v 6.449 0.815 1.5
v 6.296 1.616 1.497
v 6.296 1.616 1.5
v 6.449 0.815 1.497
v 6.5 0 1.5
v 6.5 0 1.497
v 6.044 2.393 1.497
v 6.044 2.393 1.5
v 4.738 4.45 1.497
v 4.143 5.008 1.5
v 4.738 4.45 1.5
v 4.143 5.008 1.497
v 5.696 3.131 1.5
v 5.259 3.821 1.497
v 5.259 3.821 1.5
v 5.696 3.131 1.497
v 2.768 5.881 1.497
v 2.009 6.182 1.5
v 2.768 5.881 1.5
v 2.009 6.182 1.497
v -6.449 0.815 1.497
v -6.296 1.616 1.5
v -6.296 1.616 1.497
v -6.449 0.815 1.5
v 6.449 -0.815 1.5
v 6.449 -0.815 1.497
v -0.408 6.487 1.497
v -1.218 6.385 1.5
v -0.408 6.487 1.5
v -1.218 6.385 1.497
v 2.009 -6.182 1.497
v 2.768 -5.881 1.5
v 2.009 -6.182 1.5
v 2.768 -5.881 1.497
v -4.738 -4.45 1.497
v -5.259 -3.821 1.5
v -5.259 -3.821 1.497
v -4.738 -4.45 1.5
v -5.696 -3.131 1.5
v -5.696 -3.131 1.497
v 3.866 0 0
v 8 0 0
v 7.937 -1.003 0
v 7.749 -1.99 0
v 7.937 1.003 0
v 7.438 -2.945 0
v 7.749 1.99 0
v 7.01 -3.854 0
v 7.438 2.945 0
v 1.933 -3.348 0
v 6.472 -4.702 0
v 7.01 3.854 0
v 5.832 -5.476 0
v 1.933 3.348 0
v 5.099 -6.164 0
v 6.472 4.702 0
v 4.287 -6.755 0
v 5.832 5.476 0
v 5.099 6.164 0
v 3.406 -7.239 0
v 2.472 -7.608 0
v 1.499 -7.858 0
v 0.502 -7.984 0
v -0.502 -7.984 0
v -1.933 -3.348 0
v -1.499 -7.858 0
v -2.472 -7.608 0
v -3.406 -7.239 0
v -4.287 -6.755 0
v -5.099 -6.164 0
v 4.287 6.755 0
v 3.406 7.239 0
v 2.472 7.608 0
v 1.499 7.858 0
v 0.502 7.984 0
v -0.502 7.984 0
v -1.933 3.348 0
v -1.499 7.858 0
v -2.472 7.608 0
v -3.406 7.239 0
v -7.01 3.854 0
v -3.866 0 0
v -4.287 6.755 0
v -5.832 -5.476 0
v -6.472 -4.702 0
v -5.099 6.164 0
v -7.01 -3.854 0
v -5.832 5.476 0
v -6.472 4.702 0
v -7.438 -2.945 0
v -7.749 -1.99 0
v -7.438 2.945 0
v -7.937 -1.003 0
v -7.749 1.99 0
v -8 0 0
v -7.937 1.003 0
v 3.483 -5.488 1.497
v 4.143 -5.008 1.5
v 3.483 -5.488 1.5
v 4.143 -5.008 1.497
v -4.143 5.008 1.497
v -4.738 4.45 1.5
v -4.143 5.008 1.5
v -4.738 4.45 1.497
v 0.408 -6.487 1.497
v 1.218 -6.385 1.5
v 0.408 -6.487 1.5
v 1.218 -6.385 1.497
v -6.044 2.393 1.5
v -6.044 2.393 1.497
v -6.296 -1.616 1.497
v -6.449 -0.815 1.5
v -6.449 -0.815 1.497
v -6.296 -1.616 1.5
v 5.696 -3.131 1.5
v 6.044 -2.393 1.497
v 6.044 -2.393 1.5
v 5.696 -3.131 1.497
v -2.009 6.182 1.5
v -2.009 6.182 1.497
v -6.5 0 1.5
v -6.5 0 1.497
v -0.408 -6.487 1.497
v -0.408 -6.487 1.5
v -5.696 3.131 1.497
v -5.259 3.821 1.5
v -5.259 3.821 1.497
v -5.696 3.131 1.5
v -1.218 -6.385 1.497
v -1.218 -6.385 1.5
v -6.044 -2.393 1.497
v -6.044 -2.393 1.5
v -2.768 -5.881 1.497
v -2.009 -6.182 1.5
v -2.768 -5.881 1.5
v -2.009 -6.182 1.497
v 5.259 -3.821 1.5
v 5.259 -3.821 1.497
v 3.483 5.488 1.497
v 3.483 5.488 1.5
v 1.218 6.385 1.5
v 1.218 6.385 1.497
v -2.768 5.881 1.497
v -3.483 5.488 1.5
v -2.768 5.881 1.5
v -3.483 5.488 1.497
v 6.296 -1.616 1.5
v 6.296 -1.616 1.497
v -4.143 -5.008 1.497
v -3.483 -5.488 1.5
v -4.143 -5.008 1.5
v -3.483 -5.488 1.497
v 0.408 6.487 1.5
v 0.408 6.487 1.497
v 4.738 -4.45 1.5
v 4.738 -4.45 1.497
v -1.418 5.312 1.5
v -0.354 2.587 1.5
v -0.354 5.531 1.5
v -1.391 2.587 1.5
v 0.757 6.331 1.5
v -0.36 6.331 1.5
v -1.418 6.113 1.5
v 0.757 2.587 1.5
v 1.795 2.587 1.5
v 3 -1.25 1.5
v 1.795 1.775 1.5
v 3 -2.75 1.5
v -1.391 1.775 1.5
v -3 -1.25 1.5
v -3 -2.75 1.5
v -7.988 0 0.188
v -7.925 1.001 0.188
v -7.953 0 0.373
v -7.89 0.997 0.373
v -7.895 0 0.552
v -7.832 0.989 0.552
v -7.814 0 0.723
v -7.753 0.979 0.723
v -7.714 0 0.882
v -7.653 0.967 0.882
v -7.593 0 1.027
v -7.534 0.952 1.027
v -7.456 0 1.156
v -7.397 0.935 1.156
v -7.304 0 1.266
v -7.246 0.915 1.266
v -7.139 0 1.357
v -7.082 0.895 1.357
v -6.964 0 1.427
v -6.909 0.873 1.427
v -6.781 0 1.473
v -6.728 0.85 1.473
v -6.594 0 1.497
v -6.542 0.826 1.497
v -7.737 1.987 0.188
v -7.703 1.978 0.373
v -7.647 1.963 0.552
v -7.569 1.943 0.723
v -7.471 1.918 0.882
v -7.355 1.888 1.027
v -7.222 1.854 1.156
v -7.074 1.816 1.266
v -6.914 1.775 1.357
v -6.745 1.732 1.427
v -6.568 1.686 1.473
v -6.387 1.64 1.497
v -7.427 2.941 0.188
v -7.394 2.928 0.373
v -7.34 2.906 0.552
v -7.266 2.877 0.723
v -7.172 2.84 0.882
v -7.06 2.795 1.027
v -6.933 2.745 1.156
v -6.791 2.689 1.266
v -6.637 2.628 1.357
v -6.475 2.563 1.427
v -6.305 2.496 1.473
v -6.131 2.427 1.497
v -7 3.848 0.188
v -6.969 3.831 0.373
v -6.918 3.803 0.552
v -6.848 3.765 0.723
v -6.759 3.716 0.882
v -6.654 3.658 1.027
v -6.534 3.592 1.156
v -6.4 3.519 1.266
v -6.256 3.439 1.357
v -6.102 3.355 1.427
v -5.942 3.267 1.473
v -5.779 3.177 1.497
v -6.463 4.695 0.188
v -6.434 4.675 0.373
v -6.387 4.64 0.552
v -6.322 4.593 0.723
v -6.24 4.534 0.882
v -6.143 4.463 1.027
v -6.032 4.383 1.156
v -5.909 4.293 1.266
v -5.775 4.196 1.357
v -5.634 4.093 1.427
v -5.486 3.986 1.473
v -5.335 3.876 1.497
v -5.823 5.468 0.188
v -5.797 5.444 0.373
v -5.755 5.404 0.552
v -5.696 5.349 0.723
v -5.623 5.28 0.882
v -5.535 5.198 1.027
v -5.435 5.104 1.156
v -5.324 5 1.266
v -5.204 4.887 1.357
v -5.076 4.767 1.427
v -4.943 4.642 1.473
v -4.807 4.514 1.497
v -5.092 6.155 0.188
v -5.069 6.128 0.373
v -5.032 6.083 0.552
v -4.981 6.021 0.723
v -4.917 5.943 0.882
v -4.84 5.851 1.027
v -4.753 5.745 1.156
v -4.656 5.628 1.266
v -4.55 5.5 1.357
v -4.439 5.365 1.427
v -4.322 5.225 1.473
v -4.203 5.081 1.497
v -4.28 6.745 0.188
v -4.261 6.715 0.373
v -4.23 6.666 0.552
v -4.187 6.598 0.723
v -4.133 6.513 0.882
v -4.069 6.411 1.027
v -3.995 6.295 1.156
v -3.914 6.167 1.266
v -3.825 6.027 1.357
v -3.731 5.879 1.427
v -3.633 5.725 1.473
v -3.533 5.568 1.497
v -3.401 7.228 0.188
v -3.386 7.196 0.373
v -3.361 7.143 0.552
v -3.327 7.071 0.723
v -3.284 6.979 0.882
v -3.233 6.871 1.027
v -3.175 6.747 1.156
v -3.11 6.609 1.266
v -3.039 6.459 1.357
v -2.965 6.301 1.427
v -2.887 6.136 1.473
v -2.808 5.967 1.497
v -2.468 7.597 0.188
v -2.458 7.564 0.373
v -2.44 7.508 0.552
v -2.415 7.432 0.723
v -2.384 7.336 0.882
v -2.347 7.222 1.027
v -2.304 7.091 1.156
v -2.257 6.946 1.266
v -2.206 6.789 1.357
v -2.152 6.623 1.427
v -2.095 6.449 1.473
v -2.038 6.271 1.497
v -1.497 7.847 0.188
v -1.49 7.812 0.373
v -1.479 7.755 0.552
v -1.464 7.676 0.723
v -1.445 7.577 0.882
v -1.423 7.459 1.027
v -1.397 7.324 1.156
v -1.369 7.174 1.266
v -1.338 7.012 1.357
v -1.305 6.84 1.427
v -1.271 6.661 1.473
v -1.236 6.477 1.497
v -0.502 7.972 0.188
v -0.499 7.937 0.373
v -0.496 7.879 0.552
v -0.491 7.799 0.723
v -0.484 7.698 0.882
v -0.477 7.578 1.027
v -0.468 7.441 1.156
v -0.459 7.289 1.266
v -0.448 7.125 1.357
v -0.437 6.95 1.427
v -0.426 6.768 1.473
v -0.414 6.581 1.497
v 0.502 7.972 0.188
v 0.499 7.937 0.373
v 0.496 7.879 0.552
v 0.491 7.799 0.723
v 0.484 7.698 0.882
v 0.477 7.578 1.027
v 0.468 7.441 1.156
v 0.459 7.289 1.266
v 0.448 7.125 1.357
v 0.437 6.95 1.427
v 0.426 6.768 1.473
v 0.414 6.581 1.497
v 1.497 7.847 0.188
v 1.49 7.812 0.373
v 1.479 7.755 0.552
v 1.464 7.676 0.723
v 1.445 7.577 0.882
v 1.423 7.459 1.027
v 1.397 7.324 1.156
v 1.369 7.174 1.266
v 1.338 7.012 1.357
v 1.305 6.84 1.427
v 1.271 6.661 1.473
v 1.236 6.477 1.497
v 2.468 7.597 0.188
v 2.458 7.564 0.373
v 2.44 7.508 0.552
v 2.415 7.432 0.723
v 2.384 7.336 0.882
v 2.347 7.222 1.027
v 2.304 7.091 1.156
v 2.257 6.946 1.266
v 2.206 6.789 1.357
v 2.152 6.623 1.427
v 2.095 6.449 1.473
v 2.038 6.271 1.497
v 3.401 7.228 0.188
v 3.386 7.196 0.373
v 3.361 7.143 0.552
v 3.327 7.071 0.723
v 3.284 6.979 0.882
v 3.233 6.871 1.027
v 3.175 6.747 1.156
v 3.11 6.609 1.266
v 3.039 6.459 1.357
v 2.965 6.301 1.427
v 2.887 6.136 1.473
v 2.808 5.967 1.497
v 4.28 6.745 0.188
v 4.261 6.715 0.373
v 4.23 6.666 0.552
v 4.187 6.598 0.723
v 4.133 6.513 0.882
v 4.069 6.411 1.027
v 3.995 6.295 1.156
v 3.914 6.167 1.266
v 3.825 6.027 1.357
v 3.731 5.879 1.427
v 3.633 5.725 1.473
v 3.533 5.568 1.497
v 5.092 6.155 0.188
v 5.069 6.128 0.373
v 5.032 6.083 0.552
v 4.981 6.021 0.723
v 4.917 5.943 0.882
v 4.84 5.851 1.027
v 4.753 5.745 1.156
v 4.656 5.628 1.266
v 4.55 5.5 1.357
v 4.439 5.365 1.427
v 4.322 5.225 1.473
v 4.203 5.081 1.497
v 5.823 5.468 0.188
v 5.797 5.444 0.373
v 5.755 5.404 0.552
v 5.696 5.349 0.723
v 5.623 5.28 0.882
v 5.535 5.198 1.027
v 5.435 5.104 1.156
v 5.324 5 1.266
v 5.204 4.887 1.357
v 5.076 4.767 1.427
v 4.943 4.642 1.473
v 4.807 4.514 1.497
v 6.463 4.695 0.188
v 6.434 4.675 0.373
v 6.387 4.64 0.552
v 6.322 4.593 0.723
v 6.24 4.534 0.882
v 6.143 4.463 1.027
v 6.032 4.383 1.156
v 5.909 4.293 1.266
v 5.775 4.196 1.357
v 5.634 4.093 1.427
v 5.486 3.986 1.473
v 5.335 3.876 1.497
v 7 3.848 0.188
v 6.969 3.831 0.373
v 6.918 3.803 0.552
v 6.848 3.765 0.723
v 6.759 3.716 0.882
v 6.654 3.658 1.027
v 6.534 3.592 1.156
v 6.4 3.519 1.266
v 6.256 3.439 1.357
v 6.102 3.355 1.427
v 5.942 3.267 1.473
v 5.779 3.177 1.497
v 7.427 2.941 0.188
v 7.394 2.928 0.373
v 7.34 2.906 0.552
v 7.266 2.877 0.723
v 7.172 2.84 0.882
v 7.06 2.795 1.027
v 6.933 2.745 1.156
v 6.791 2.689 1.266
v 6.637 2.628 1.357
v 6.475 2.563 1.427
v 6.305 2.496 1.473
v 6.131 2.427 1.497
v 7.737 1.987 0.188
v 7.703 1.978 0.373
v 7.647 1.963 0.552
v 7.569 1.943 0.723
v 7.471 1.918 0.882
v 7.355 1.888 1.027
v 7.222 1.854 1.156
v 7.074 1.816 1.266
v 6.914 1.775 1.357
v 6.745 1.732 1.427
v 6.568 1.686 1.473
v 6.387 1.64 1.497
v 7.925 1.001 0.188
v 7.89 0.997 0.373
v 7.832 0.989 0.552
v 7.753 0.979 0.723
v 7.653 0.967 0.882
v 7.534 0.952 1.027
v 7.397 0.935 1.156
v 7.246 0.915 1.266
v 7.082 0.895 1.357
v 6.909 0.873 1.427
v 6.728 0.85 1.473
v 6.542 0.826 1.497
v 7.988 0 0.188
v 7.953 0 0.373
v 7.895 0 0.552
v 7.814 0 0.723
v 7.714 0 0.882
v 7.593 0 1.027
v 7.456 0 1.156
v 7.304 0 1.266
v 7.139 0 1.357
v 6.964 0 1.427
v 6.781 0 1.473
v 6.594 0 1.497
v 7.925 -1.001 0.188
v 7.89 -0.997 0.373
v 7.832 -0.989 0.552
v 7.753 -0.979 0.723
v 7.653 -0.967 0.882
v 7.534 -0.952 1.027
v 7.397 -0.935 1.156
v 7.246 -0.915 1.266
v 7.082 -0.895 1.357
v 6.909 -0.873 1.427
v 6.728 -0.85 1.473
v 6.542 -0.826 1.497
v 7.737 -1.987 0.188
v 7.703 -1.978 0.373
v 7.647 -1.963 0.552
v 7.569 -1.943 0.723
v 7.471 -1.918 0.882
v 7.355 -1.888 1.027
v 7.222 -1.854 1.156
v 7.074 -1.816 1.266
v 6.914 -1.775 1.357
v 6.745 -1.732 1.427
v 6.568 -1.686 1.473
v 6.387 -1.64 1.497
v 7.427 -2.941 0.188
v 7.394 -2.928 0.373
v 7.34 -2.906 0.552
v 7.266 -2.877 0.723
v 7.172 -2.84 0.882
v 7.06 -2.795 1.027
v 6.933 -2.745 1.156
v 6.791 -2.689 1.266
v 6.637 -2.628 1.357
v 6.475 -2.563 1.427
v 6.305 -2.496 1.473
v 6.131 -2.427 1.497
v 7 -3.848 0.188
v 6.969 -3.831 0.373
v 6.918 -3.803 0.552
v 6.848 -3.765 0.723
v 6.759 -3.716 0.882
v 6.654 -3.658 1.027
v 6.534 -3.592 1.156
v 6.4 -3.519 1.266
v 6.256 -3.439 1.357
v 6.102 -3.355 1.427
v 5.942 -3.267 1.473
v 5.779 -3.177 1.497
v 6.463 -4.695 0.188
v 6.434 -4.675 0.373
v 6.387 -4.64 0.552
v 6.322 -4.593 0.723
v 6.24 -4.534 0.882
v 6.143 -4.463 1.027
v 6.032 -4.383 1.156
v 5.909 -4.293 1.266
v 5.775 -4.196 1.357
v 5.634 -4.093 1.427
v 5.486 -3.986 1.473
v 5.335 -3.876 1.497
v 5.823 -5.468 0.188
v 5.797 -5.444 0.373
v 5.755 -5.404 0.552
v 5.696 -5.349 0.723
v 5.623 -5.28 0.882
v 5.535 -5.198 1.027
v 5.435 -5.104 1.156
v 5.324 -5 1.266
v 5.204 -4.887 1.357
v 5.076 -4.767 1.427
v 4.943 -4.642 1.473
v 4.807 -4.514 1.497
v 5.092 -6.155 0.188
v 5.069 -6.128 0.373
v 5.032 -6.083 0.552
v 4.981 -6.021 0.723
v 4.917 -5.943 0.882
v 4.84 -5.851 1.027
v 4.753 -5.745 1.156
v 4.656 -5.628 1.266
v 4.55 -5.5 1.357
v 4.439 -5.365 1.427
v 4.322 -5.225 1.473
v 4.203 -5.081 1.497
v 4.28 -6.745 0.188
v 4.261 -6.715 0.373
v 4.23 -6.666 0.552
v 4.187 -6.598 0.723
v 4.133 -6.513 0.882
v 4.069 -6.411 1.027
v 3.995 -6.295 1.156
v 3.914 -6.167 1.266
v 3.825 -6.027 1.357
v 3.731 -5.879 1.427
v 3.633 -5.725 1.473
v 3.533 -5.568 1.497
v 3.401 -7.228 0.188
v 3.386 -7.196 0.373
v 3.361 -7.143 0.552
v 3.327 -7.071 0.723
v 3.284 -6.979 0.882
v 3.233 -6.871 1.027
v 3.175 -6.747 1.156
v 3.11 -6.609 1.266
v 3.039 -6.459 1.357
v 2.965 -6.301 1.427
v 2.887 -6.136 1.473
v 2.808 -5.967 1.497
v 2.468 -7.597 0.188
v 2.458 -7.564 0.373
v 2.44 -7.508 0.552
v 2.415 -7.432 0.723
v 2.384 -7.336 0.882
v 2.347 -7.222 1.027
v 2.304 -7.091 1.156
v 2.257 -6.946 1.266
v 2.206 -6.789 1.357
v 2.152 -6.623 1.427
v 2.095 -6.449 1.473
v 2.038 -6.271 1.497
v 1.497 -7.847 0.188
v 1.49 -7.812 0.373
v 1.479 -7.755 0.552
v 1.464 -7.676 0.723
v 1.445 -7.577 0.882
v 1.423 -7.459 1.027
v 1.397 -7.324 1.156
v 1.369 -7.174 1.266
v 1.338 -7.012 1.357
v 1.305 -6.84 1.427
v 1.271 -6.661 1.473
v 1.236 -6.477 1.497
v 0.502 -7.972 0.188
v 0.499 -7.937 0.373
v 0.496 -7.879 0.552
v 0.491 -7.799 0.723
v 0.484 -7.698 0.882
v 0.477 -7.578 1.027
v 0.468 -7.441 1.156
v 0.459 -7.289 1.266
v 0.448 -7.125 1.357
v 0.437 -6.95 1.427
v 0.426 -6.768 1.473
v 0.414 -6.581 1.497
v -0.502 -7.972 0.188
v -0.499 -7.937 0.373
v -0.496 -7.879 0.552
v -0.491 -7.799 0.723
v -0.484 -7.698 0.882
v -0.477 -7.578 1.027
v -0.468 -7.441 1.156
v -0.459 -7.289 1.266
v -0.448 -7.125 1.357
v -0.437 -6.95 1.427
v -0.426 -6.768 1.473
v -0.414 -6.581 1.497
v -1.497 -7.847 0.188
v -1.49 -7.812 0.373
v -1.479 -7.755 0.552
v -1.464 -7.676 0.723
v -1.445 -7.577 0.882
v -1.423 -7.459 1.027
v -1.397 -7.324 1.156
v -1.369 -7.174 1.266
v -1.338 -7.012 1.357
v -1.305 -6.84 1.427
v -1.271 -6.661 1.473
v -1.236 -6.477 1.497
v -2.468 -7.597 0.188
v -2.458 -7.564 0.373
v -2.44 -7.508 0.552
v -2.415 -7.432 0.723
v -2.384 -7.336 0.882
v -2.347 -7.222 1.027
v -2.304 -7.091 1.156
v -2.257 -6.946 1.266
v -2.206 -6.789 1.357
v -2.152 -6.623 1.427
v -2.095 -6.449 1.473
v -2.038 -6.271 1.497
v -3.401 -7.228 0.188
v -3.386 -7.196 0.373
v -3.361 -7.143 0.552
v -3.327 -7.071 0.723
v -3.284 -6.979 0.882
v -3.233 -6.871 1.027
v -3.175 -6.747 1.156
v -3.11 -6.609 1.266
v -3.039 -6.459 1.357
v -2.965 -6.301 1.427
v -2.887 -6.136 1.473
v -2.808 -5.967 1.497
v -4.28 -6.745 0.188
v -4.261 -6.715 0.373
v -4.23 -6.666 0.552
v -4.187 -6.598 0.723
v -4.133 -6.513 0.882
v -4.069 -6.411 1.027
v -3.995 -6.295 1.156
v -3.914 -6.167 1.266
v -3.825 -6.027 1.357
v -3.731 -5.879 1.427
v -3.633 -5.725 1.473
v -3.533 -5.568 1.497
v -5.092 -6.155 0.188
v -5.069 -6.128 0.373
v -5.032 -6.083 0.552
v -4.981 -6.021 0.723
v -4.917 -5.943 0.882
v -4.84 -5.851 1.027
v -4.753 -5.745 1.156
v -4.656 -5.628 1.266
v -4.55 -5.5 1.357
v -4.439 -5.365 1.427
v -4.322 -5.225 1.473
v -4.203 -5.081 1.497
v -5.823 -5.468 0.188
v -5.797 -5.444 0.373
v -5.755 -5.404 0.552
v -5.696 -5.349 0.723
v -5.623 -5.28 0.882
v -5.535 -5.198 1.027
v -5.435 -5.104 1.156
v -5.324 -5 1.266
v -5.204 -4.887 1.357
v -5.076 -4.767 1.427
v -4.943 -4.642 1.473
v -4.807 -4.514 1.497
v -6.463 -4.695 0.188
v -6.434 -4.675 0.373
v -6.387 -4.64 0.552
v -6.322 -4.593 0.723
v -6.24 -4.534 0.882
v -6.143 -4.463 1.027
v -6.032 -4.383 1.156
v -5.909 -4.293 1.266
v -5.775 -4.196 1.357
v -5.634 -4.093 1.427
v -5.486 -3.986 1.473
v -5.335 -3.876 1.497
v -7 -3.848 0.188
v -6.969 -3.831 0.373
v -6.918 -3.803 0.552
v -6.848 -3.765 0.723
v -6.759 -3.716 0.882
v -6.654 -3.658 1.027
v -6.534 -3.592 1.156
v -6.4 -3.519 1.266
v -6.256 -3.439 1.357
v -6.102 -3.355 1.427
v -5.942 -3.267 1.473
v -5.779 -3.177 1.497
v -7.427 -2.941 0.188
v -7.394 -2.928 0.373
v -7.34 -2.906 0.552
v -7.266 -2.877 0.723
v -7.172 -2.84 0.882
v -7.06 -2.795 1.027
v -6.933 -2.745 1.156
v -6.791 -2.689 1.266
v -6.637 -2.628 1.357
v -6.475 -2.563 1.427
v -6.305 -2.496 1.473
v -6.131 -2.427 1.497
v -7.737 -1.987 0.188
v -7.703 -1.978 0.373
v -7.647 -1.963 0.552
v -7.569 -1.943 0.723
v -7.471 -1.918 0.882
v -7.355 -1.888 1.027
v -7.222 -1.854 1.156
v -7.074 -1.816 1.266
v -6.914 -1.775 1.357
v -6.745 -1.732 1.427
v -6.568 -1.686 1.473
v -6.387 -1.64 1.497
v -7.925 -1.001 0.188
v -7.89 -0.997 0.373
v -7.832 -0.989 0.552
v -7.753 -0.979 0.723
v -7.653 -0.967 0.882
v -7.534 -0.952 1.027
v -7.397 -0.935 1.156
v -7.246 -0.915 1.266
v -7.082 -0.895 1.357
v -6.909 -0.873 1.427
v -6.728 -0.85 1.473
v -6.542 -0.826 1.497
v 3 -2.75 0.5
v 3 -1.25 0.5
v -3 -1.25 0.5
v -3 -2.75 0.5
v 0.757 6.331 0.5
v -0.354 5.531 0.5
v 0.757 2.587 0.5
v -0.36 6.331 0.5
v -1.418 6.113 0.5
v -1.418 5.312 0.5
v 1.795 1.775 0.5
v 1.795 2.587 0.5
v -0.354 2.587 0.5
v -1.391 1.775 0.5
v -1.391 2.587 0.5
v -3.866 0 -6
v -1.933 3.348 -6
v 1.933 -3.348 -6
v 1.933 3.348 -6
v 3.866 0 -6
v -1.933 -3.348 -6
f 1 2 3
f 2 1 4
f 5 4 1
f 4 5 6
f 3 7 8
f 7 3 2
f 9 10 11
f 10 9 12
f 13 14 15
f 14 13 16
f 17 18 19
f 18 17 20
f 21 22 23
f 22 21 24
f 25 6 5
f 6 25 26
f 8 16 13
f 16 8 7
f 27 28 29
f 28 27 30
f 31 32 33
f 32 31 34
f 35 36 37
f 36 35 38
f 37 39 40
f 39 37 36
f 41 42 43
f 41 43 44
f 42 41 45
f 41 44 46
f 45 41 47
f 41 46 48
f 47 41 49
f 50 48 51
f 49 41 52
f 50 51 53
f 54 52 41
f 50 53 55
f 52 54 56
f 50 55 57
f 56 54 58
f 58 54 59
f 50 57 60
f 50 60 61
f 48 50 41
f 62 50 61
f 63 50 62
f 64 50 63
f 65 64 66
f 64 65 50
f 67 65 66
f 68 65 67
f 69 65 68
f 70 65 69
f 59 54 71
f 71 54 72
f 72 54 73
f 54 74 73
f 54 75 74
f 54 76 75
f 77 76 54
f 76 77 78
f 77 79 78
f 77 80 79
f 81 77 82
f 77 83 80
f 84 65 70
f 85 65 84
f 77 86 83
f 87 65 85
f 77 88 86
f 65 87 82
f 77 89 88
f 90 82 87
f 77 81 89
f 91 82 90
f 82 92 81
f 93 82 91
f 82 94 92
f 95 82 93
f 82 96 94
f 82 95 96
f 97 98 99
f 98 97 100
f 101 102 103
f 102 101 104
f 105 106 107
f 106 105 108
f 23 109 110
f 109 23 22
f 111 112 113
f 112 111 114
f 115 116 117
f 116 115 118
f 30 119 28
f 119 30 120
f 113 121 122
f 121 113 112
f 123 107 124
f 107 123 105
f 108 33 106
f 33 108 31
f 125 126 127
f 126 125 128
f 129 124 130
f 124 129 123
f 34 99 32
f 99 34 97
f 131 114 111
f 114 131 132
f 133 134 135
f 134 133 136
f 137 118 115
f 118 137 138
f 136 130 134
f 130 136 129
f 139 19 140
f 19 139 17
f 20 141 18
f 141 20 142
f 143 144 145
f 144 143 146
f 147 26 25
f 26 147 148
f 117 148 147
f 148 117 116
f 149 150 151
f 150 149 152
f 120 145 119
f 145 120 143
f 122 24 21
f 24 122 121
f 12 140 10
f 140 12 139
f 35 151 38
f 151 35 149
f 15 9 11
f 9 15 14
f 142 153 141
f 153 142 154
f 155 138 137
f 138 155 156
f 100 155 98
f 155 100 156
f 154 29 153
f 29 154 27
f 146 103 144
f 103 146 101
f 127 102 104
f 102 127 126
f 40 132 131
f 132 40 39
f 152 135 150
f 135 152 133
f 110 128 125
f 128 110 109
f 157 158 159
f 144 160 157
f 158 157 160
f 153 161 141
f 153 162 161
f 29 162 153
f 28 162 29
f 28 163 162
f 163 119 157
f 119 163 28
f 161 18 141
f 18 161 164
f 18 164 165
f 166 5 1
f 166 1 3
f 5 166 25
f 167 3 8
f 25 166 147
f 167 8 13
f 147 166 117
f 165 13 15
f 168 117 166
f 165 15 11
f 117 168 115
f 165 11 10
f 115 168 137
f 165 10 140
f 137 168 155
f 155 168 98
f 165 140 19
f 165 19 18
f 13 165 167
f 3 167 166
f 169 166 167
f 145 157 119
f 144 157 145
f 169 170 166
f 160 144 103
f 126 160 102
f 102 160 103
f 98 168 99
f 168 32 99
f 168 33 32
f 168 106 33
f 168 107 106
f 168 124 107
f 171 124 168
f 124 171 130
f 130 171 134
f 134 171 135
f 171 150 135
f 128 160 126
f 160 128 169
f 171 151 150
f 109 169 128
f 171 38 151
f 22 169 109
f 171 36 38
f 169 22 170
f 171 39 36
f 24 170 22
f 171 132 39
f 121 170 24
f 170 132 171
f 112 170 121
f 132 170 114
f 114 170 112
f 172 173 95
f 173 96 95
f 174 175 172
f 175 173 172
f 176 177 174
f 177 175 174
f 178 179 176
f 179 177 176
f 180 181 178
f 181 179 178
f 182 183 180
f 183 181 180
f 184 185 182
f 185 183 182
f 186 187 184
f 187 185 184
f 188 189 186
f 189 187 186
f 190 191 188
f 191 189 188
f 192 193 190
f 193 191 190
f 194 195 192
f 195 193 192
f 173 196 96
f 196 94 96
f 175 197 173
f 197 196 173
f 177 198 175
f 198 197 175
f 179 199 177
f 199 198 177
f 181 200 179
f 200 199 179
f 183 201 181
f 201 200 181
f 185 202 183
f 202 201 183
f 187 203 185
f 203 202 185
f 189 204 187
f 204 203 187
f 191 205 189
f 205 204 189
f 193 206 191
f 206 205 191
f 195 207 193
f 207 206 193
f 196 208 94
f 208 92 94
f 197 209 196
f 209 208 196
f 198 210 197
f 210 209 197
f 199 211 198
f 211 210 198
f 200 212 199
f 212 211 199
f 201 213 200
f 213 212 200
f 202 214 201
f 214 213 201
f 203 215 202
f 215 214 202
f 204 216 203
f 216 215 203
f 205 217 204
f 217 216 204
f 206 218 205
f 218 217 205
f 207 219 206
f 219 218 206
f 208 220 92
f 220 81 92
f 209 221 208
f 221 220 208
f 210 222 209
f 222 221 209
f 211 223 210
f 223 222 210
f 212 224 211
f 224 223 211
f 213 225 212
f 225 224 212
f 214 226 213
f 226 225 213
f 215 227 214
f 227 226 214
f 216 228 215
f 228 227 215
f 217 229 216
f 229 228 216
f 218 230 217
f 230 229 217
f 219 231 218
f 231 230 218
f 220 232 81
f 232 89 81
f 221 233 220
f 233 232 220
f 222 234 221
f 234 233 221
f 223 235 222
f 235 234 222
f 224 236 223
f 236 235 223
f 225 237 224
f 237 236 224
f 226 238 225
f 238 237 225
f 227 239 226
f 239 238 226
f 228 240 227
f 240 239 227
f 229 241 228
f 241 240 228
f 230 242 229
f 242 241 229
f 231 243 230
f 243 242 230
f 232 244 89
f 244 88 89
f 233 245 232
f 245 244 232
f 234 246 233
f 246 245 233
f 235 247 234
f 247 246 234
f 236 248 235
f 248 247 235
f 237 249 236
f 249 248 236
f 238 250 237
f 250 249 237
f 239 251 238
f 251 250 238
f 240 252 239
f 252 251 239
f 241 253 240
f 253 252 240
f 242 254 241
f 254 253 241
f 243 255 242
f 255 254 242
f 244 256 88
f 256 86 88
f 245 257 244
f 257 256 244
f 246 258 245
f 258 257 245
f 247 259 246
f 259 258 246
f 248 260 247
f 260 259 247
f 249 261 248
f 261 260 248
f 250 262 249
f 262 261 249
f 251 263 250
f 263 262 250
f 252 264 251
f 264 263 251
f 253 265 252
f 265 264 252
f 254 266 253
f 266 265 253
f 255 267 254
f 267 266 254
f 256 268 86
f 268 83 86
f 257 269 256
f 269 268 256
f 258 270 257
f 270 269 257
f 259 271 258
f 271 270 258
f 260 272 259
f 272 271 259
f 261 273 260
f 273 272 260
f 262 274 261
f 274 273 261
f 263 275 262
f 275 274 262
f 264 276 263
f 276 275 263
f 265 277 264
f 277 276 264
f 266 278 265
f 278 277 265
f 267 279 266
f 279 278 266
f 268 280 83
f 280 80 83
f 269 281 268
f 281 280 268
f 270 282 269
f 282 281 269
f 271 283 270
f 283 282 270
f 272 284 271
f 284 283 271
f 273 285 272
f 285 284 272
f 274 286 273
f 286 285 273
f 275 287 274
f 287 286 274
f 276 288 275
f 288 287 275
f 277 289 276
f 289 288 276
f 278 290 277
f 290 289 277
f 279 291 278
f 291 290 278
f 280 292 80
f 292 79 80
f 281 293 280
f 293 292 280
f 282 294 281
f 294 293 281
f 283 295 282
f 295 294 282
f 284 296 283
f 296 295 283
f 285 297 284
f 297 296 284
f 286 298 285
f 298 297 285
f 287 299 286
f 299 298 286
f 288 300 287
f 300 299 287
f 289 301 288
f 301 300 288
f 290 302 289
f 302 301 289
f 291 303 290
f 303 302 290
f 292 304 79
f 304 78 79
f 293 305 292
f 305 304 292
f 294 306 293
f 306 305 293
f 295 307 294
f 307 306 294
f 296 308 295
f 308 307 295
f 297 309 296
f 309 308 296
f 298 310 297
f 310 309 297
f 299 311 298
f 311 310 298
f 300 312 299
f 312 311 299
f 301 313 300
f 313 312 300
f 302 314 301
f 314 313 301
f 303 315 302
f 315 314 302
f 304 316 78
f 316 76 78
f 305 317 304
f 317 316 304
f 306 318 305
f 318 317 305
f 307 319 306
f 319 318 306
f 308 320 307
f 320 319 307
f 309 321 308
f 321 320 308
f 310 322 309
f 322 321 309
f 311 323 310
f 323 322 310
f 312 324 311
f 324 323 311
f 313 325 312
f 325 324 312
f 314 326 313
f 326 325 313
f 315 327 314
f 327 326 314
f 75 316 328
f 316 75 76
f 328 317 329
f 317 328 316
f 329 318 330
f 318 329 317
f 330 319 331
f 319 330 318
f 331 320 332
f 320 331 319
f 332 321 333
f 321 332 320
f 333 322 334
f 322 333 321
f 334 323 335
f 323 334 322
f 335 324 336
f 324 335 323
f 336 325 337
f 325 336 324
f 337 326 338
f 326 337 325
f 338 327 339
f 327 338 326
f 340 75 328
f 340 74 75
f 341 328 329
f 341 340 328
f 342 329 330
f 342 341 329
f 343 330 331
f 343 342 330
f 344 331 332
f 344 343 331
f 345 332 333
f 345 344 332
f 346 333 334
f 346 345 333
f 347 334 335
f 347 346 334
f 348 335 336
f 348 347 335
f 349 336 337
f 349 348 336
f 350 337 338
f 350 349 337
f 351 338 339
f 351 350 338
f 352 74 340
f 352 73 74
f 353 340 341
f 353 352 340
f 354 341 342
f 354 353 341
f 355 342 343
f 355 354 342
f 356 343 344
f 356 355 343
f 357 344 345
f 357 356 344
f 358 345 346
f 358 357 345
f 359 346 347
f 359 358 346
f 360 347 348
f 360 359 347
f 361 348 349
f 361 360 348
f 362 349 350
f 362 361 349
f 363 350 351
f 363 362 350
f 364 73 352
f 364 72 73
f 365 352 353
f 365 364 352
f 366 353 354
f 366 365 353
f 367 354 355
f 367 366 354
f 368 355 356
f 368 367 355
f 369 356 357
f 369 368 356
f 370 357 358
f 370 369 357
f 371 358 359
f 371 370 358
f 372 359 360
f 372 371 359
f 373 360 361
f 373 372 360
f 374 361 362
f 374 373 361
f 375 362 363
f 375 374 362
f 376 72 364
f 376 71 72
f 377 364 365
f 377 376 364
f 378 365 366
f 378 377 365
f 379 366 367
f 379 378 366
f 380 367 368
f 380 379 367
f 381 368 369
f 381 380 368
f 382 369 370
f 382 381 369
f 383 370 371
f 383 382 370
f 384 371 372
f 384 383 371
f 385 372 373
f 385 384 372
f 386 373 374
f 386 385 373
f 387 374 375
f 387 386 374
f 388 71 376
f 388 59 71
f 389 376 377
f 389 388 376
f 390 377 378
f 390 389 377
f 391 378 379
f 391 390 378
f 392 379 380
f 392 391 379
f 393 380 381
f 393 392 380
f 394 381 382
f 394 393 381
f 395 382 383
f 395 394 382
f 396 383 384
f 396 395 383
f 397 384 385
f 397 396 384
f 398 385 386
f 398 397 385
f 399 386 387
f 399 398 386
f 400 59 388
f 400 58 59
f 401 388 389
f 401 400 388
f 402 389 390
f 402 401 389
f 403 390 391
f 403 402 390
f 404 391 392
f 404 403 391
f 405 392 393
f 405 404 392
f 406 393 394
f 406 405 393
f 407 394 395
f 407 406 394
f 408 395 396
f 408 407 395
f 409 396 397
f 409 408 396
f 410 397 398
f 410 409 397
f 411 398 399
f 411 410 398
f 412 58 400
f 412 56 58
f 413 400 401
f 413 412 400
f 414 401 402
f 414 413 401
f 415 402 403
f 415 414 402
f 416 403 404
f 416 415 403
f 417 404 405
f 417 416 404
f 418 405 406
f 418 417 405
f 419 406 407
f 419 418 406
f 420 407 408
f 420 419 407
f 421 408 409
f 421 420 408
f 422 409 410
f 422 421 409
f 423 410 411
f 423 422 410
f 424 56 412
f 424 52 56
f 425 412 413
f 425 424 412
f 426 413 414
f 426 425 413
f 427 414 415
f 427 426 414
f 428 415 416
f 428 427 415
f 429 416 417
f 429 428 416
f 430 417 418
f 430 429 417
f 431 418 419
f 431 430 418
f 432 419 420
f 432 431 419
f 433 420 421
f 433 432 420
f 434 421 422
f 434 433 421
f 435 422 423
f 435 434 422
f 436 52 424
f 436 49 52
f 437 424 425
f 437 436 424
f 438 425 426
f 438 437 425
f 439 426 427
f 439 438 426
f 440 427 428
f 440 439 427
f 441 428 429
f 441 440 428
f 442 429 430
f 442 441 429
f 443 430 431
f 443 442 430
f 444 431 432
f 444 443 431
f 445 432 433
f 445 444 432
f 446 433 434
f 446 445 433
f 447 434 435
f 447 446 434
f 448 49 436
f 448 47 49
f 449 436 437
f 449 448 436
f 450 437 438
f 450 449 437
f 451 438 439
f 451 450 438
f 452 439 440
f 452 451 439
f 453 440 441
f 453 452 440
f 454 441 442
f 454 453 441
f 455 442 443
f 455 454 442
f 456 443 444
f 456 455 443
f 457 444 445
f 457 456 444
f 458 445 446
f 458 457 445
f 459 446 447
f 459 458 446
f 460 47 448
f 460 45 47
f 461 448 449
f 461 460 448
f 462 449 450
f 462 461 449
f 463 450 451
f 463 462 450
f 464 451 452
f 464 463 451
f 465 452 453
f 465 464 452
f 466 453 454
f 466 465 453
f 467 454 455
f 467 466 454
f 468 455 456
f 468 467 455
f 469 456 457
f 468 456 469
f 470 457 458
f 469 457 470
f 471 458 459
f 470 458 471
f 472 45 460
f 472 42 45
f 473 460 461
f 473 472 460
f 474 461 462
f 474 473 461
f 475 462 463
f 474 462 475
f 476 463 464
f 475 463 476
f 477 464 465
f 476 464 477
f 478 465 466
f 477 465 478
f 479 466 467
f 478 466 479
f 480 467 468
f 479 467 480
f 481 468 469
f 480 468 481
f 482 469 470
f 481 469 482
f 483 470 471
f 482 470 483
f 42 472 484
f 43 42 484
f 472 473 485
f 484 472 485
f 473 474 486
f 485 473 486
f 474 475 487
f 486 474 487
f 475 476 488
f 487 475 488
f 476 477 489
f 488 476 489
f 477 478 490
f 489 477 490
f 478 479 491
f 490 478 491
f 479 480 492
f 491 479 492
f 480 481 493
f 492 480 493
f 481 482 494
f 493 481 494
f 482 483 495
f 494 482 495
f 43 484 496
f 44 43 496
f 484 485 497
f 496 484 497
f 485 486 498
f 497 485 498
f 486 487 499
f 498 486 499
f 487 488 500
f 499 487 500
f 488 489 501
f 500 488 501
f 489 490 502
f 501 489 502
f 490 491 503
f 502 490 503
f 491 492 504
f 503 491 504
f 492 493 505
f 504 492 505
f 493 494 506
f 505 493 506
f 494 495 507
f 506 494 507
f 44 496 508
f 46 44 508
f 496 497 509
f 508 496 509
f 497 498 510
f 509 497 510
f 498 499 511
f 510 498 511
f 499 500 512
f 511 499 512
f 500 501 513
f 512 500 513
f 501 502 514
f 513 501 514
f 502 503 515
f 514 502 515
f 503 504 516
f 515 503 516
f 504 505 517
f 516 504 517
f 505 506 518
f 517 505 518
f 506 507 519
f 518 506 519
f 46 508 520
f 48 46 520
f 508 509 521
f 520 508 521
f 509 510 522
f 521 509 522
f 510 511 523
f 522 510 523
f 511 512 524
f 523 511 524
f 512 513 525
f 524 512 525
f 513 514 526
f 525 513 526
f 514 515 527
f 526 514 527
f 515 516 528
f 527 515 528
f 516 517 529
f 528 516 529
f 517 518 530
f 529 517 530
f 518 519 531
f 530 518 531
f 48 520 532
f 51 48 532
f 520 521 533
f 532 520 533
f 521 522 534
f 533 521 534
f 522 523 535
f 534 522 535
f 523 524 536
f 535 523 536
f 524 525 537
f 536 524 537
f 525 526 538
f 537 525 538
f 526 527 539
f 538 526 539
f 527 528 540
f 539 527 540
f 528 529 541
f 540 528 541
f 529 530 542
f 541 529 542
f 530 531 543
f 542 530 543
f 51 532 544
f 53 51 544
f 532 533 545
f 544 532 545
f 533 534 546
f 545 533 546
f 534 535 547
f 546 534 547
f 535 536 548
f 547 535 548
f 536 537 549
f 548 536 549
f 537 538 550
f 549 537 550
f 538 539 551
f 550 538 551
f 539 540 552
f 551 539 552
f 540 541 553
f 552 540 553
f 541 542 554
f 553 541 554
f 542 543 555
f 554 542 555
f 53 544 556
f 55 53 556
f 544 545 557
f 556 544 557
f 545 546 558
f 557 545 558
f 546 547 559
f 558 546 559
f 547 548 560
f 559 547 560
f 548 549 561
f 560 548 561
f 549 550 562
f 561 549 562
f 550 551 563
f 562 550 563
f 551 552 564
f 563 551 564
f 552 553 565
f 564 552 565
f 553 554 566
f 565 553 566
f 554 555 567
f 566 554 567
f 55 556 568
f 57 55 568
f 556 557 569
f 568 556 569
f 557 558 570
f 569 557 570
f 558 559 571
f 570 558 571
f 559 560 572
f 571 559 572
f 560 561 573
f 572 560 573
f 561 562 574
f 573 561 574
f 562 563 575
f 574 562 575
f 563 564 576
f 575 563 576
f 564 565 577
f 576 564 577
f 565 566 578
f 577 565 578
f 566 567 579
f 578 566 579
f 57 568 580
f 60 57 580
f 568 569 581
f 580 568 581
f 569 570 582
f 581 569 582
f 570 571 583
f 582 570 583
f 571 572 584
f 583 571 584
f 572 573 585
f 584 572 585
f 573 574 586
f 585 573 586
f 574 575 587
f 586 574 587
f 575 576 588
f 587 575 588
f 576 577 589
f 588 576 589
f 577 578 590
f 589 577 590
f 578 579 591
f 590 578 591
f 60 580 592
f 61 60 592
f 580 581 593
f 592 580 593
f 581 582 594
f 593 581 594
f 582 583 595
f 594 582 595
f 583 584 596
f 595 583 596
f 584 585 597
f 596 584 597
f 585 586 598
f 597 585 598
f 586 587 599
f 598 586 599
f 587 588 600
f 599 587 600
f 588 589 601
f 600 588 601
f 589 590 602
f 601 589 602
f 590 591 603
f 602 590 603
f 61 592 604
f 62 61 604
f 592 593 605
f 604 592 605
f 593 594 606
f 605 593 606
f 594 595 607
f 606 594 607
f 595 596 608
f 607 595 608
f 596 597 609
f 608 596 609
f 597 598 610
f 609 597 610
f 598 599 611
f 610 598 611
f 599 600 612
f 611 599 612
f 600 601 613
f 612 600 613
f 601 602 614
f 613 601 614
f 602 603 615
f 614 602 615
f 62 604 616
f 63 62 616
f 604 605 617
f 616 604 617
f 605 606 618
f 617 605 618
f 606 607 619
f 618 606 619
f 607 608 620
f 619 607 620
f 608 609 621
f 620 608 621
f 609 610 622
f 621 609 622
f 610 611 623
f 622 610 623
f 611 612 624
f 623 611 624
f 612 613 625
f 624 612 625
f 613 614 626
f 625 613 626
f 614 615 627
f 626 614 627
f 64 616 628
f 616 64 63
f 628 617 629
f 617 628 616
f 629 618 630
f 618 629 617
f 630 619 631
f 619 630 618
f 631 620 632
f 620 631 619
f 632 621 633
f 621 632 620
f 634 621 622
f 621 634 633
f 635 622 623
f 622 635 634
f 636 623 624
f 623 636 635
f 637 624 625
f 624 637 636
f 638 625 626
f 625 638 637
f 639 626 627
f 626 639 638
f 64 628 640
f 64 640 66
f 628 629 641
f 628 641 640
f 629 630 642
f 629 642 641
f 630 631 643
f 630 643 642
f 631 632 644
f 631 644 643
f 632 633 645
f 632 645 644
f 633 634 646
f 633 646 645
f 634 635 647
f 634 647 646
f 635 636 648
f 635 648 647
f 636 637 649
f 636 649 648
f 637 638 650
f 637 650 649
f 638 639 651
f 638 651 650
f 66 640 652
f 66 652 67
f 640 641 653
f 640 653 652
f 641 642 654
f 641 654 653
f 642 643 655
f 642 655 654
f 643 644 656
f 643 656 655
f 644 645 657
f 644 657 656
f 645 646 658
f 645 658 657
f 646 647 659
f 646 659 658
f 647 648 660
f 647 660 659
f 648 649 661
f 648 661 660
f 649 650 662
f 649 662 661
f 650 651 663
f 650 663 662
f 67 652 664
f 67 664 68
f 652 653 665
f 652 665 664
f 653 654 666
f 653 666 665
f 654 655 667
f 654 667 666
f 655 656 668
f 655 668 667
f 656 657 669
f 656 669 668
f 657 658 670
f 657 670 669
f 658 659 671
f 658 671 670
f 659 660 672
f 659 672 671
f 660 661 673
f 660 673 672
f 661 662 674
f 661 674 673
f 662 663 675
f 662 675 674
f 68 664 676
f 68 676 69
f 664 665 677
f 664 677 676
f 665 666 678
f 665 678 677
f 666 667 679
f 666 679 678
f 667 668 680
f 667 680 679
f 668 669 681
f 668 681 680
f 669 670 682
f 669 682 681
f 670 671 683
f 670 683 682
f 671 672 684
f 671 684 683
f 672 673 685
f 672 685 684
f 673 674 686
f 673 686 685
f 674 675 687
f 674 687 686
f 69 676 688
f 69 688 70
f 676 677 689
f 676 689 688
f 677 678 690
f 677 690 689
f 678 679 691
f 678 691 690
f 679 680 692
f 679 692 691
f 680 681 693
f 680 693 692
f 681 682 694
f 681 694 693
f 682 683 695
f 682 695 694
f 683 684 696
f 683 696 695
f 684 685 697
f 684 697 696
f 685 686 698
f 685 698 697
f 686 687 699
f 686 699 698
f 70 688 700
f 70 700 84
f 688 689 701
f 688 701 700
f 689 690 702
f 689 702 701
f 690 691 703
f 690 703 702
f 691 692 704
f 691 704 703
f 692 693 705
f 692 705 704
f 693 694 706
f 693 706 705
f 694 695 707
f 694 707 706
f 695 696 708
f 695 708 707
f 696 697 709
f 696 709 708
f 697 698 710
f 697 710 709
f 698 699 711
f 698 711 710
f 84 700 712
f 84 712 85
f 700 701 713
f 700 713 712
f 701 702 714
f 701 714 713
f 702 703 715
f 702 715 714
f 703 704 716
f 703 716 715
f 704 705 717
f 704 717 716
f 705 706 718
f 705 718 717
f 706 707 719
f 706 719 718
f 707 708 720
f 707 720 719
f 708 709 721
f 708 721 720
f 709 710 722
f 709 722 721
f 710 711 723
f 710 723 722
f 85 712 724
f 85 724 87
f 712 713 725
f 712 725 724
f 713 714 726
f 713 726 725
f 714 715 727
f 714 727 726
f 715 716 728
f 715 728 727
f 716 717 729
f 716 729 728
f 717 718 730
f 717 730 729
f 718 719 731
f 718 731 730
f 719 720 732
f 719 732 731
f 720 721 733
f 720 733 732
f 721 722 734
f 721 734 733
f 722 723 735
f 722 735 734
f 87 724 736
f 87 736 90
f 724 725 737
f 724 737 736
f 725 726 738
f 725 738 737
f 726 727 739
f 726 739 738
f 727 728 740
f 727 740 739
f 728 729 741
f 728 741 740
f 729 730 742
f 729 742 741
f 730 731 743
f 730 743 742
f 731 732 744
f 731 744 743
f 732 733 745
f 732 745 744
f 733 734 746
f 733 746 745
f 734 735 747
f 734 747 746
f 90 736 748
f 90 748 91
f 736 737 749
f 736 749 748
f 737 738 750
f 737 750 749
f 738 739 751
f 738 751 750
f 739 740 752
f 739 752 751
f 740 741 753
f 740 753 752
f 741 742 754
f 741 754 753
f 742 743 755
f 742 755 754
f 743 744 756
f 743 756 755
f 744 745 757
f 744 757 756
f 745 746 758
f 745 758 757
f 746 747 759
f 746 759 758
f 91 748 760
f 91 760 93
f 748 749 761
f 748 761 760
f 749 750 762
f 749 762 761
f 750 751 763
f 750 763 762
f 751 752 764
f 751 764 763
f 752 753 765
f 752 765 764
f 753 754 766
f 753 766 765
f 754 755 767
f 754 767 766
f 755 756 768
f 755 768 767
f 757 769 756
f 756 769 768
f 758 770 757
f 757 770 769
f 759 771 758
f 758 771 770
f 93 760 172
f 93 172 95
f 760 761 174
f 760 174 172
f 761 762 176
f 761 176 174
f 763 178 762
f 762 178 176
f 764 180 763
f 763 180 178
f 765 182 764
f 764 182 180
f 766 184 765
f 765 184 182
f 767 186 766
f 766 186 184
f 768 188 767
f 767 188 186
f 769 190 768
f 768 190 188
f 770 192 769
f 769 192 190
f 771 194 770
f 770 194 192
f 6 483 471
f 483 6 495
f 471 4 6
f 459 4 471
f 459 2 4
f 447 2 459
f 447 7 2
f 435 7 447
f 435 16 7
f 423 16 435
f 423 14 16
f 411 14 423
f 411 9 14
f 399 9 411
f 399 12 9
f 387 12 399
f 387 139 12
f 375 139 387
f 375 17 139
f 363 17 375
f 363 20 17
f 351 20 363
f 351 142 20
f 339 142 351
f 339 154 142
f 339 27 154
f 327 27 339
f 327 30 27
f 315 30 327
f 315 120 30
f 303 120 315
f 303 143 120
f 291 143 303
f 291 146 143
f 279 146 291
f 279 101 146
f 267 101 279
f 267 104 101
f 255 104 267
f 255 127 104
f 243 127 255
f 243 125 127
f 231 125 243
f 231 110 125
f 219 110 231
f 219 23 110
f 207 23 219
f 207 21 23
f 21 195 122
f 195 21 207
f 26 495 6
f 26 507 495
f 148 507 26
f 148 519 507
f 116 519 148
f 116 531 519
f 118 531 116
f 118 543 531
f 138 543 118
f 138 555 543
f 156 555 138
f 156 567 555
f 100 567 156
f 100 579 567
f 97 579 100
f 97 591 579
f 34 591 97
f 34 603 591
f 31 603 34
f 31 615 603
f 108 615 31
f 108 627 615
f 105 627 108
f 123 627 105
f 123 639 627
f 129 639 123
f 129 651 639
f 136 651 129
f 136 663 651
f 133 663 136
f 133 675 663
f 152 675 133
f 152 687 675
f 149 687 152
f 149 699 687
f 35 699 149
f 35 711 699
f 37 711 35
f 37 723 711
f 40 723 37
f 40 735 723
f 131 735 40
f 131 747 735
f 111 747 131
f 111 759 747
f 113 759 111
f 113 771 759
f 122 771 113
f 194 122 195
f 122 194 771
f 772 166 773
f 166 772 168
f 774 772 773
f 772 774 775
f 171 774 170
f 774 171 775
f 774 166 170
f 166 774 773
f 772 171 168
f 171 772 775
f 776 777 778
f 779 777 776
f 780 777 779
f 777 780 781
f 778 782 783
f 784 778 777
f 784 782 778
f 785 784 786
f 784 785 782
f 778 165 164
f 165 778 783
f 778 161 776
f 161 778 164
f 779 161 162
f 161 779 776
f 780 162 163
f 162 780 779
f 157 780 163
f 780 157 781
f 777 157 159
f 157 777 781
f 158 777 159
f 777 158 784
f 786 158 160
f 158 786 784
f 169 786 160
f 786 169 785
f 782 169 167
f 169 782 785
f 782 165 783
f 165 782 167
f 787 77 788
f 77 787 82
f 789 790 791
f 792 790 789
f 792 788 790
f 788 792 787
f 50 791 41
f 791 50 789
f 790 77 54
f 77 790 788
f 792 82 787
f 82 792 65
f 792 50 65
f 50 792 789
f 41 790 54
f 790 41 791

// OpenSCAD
$fn = 50;


union() {
	difference() {
		union() {
			cylinder(h = 1.5000000000, r = 6.5000000000);
			rotate_extrude(angle = 360) {
				translate(v = [6.5000000000, 0, 0]) {
					circle(r = 1.5000000000);
				}
			}
		}
		union() {
			translate(v = [-25.0000000000, -25.0000000000, -50]) {
				cube(size = [50, 50, 50]);
			}
			#translate(v = [-3.0000000000, -2.7500000000, 0.5000000000]) {
				cube(size = [6, 1.5000000000, 1]);
			}
			#translate(v = [0, 4, 0.5000000000]) {
				linear_extrude(height = 1) {
					text(font = "SegoiUI:Bold", halign = "center", size = 4.5000000000, text = "1", valign = "center");
				}
			}
		}
	}
	union() {
		translate(v = [0, 0, -6]) {
			linear_extrude(height = 6) {
				polygon(points = [[3.8658550000, 0.0000000000], [1.9329275000, 3.3479286373], [-1.9329275000, 3.3479286373], [-3.8658550000, 0.0000000000], [-1.9329275000, -3.3479286373], [1.9329275000, -3.3479286373]]);
			}
		}
	}
}
